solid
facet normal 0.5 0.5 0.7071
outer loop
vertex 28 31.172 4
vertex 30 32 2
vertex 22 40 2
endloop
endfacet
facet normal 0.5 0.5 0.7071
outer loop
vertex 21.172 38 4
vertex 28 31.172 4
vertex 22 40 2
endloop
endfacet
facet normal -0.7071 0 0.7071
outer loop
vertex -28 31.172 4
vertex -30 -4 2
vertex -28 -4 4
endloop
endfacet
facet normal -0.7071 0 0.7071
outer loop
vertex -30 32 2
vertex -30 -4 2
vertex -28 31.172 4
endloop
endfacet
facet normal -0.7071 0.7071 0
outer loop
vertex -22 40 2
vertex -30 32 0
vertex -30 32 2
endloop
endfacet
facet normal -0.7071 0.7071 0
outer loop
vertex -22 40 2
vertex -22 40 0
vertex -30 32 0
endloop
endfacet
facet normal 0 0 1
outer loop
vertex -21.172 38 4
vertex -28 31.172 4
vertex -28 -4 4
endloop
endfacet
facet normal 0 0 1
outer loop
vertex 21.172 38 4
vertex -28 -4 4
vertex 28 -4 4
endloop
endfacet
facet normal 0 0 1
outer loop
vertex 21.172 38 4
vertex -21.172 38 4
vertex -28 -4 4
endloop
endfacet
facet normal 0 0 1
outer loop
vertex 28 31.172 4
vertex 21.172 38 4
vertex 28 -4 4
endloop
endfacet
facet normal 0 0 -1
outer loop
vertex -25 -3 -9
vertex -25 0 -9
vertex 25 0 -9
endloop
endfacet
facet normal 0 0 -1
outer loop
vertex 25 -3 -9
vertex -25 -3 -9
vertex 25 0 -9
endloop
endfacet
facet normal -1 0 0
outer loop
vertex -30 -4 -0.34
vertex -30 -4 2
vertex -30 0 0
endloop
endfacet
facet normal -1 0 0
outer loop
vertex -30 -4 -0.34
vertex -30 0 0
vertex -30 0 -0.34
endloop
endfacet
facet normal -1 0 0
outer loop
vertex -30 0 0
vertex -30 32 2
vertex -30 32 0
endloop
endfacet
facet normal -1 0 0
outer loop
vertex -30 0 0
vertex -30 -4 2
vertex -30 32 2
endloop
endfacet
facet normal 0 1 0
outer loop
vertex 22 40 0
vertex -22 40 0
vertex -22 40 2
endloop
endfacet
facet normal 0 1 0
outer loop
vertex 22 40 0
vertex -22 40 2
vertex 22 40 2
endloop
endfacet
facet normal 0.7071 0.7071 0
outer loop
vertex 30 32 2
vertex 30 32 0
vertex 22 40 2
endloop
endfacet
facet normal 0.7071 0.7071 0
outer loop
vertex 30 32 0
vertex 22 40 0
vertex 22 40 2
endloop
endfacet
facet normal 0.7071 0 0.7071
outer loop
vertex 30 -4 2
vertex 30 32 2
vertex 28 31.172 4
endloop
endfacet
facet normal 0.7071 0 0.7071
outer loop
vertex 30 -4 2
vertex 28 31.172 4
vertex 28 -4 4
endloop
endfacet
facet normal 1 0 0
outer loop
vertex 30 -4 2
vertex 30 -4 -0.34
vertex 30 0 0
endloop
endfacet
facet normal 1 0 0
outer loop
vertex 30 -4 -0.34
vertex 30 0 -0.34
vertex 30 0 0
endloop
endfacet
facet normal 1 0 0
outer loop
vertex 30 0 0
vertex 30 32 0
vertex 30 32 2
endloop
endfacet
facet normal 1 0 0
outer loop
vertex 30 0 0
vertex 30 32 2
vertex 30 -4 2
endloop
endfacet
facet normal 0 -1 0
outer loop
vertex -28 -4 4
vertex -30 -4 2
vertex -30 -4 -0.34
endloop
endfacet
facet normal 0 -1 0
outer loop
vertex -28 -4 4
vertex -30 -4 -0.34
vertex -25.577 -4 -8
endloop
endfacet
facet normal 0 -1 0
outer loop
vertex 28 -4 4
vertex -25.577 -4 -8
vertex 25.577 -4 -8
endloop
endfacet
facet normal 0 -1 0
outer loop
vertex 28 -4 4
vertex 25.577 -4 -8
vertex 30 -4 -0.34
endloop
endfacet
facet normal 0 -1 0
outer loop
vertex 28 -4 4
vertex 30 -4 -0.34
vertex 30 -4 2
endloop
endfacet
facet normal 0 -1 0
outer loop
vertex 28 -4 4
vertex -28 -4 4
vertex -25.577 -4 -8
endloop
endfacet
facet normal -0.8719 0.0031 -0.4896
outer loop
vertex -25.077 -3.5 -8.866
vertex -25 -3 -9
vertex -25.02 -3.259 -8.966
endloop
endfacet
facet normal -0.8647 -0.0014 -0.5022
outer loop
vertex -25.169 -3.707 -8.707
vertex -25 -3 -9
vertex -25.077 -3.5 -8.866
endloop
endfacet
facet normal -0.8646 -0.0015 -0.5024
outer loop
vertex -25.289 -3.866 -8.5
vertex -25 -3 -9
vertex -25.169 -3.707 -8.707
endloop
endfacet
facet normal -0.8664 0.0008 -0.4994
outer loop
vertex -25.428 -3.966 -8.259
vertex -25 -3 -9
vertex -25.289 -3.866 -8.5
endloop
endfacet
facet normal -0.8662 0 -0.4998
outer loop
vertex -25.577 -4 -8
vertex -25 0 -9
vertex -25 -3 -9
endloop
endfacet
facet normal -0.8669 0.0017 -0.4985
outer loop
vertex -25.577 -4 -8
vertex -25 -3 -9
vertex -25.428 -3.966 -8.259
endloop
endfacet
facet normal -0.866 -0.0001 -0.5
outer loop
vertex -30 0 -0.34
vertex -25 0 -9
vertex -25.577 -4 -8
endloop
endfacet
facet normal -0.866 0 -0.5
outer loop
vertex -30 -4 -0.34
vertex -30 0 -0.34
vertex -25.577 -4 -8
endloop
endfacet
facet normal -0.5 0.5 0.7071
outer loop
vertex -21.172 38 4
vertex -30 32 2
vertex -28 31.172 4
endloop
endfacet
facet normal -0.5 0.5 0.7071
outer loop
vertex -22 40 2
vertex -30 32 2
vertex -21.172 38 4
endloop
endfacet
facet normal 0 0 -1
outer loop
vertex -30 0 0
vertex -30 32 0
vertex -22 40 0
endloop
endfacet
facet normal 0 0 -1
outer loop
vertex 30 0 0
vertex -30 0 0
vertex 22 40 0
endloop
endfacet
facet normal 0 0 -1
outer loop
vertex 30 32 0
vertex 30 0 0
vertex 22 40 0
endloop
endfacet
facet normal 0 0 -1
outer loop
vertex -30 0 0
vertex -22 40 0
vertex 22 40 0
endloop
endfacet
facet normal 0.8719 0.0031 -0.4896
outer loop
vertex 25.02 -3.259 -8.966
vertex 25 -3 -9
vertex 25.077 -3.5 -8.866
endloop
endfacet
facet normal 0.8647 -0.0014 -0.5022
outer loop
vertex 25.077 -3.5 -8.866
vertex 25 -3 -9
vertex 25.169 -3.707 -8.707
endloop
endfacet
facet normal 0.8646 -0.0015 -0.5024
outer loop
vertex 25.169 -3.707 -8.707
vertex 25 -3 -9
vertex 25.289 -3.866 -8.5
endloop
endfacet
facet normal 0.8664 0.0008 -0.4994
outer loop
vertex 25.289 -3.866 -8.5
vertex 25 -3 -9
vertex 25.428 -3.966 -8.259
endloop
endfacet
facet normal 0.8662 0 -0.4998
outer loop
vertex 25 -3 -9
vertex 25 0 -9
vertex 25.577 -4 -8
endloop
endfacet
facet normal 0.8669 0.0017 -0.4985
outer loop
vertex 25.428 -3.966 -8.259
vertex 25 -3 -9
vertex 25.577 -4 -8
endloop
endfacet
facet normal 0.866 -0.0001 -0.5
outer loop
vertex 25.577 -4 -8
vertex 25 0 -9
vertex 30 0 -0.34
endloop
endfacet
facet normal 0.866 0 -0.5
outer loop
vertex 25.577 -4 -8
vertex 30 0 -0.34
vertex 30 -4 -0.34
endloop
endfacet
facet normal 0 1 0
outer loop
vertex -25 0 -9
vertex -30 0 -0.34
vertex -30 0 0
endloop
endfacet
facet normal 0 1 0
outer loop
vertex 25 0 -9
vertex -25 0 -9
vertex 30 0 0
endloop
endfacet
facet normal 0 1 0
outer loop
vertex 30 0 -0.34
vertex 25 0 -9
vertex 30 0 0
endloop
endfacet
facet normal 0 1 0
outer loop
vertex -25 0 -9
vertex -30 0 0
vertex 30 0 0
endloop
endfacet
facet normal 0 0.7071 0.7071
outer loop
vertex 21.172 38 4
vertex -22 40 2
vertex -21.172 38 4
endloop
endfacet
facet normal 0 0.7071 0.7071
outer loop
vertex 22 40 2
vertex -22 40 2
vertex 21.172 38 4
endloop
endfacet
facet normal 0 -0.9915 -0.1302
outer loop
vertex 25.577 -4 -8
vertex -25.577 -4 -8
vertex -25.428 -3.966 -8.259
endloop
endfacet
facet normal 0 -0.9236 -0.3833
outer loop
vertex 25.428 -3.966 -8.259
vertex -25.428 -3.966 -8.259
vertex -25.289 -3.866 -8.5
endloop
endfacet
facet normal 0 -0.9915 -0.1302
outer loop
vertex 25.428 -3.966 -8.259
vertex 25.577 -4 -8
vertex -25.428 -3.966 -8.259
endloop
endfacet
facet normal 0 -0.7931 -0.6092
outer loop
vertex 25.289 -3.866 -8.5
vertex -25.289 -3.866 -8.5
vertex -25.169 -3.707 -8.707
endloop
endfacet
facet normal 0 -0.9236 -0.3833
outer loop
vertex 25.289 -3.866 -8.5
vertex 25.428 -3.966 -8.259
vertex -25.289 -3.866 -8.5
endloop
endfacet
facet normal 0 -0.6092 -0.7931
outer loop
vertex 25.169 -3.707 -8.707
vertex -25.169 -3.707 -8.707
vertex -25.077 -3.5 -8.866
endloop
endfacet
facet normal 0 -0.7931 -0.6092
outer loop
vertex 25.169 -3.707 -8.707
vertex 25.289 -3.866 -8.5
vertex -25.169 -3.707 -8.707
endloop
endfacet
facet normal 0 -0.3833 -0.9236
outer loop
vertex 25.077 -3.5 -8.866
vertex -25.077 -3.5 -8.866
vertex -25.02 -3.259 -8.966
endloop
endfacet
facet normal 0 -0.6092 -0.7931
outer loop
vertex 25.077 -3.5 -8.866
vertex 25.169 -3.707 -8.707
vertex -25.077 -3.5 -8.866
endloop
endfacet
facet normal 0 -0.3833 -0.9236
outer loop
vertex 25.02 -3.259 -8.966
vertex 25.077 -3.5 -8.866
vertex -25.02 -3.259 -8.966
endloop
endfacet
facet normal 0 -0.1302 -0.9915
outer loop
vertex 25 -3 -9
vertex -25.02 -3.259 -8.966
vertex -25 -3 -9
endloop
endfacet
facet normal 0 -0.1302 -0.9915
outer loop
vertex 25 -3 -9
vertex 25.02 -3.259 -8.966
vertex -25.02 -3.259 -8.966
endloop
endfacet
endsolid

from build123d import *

# Parameters (mm, degrees)
F0_W     = 60
F0_H     = 40
F1_DEPTH = 5
F2_SIZE  = 8
F3_W     = 60
F3_H     = 9
F3_H_2   = 5
F4_DEPTH = 4
F5_SIZE  = 3
F6_SIZE2 = 8.6602540378
F6_SIZE  = 5
F7_R     = 1
F8_W     = 85.4819267988
F8_H     = 62.53941264
F9_DEPTH = 1


with BuildPart() as f1:
    # F0 (on Top) → F1 (new body)
    with BuildSketch(Plane.XY):
        with Locations((0, 20)):
            Rectangle(F0_W, F0_H)
    extrude(amount=F1_DEPTH)

    # F2
    f2_edges = [f1.edges().sort_by_distance(p)[0] for p in [
        (30, 40, 2.5),
        (-30, 40, 2.5),
    ]]
    chamfer(f2_edges, length=F2_SIZE)

    # F3 (on face) → F4 (join)
    with BuildSketch(Plane.XZ):
        with Locations((0, -4.5)):
            Rectangle(F3_W, F3_H)
        with Locations((0, 2.5)):
            Rectangle(F3_W, F3_H_2)
    extrude(amount=F4_DEPTH)

    # F5
    f5_edges = [f1.edges().sort_by_distance(p)[0] for p in [
        (-30, 14, 5),
        (30, 14, 5),
        (0, 40, 5),
        (26, 36, 5),
        (-26, 36, 5),
    ]]
    chamfer(f5_edges, length=F5_SIZE)

    # F6
    f6_edges = [f1.edges().sort_by_distance(p)[0] for p in [
        (-30, -2, -9),
        (30, -2, -9),
    ]]
    f6_side = f1.faces().sort_by_distance((0, -2, -9))[0]
    chamfer(f6_edges, length=F6_SIZE, length2=F6_SIZE2, reference=f6_side)

    # F7
    f7_edges = [f1.edges().sort_by_distance(p)[0] for p in [
        (0, -4, -9),
    ]]
    fillet(f7_edges, radius=F7_R)

    # F8 (on face) → F9 (cut)
    with BuildSketch(Plane.XY.offset(5)):
        with Locations((-1.7423257232, 24.269700516)):
            Rectangle(F8_W, F8_H)
        Polygon((27, -4), (-27, -4), (-27, 30.7573593129), (-20.7573593129, 37), (20.7573593129, 37), (27, 30.7573593129), align=None, mode=Mode.SUBTRACT)
        Polygon((-27, 30.7573593129), (-27, -4), (27, -4), (27, 30.7573593129), (20.7573593129, 37), (-20.7573593129, 37), align=None)
    extrude(amount=-F9_DEPTH, mode=Mode.SUBTRACT)


solid = f1.part
